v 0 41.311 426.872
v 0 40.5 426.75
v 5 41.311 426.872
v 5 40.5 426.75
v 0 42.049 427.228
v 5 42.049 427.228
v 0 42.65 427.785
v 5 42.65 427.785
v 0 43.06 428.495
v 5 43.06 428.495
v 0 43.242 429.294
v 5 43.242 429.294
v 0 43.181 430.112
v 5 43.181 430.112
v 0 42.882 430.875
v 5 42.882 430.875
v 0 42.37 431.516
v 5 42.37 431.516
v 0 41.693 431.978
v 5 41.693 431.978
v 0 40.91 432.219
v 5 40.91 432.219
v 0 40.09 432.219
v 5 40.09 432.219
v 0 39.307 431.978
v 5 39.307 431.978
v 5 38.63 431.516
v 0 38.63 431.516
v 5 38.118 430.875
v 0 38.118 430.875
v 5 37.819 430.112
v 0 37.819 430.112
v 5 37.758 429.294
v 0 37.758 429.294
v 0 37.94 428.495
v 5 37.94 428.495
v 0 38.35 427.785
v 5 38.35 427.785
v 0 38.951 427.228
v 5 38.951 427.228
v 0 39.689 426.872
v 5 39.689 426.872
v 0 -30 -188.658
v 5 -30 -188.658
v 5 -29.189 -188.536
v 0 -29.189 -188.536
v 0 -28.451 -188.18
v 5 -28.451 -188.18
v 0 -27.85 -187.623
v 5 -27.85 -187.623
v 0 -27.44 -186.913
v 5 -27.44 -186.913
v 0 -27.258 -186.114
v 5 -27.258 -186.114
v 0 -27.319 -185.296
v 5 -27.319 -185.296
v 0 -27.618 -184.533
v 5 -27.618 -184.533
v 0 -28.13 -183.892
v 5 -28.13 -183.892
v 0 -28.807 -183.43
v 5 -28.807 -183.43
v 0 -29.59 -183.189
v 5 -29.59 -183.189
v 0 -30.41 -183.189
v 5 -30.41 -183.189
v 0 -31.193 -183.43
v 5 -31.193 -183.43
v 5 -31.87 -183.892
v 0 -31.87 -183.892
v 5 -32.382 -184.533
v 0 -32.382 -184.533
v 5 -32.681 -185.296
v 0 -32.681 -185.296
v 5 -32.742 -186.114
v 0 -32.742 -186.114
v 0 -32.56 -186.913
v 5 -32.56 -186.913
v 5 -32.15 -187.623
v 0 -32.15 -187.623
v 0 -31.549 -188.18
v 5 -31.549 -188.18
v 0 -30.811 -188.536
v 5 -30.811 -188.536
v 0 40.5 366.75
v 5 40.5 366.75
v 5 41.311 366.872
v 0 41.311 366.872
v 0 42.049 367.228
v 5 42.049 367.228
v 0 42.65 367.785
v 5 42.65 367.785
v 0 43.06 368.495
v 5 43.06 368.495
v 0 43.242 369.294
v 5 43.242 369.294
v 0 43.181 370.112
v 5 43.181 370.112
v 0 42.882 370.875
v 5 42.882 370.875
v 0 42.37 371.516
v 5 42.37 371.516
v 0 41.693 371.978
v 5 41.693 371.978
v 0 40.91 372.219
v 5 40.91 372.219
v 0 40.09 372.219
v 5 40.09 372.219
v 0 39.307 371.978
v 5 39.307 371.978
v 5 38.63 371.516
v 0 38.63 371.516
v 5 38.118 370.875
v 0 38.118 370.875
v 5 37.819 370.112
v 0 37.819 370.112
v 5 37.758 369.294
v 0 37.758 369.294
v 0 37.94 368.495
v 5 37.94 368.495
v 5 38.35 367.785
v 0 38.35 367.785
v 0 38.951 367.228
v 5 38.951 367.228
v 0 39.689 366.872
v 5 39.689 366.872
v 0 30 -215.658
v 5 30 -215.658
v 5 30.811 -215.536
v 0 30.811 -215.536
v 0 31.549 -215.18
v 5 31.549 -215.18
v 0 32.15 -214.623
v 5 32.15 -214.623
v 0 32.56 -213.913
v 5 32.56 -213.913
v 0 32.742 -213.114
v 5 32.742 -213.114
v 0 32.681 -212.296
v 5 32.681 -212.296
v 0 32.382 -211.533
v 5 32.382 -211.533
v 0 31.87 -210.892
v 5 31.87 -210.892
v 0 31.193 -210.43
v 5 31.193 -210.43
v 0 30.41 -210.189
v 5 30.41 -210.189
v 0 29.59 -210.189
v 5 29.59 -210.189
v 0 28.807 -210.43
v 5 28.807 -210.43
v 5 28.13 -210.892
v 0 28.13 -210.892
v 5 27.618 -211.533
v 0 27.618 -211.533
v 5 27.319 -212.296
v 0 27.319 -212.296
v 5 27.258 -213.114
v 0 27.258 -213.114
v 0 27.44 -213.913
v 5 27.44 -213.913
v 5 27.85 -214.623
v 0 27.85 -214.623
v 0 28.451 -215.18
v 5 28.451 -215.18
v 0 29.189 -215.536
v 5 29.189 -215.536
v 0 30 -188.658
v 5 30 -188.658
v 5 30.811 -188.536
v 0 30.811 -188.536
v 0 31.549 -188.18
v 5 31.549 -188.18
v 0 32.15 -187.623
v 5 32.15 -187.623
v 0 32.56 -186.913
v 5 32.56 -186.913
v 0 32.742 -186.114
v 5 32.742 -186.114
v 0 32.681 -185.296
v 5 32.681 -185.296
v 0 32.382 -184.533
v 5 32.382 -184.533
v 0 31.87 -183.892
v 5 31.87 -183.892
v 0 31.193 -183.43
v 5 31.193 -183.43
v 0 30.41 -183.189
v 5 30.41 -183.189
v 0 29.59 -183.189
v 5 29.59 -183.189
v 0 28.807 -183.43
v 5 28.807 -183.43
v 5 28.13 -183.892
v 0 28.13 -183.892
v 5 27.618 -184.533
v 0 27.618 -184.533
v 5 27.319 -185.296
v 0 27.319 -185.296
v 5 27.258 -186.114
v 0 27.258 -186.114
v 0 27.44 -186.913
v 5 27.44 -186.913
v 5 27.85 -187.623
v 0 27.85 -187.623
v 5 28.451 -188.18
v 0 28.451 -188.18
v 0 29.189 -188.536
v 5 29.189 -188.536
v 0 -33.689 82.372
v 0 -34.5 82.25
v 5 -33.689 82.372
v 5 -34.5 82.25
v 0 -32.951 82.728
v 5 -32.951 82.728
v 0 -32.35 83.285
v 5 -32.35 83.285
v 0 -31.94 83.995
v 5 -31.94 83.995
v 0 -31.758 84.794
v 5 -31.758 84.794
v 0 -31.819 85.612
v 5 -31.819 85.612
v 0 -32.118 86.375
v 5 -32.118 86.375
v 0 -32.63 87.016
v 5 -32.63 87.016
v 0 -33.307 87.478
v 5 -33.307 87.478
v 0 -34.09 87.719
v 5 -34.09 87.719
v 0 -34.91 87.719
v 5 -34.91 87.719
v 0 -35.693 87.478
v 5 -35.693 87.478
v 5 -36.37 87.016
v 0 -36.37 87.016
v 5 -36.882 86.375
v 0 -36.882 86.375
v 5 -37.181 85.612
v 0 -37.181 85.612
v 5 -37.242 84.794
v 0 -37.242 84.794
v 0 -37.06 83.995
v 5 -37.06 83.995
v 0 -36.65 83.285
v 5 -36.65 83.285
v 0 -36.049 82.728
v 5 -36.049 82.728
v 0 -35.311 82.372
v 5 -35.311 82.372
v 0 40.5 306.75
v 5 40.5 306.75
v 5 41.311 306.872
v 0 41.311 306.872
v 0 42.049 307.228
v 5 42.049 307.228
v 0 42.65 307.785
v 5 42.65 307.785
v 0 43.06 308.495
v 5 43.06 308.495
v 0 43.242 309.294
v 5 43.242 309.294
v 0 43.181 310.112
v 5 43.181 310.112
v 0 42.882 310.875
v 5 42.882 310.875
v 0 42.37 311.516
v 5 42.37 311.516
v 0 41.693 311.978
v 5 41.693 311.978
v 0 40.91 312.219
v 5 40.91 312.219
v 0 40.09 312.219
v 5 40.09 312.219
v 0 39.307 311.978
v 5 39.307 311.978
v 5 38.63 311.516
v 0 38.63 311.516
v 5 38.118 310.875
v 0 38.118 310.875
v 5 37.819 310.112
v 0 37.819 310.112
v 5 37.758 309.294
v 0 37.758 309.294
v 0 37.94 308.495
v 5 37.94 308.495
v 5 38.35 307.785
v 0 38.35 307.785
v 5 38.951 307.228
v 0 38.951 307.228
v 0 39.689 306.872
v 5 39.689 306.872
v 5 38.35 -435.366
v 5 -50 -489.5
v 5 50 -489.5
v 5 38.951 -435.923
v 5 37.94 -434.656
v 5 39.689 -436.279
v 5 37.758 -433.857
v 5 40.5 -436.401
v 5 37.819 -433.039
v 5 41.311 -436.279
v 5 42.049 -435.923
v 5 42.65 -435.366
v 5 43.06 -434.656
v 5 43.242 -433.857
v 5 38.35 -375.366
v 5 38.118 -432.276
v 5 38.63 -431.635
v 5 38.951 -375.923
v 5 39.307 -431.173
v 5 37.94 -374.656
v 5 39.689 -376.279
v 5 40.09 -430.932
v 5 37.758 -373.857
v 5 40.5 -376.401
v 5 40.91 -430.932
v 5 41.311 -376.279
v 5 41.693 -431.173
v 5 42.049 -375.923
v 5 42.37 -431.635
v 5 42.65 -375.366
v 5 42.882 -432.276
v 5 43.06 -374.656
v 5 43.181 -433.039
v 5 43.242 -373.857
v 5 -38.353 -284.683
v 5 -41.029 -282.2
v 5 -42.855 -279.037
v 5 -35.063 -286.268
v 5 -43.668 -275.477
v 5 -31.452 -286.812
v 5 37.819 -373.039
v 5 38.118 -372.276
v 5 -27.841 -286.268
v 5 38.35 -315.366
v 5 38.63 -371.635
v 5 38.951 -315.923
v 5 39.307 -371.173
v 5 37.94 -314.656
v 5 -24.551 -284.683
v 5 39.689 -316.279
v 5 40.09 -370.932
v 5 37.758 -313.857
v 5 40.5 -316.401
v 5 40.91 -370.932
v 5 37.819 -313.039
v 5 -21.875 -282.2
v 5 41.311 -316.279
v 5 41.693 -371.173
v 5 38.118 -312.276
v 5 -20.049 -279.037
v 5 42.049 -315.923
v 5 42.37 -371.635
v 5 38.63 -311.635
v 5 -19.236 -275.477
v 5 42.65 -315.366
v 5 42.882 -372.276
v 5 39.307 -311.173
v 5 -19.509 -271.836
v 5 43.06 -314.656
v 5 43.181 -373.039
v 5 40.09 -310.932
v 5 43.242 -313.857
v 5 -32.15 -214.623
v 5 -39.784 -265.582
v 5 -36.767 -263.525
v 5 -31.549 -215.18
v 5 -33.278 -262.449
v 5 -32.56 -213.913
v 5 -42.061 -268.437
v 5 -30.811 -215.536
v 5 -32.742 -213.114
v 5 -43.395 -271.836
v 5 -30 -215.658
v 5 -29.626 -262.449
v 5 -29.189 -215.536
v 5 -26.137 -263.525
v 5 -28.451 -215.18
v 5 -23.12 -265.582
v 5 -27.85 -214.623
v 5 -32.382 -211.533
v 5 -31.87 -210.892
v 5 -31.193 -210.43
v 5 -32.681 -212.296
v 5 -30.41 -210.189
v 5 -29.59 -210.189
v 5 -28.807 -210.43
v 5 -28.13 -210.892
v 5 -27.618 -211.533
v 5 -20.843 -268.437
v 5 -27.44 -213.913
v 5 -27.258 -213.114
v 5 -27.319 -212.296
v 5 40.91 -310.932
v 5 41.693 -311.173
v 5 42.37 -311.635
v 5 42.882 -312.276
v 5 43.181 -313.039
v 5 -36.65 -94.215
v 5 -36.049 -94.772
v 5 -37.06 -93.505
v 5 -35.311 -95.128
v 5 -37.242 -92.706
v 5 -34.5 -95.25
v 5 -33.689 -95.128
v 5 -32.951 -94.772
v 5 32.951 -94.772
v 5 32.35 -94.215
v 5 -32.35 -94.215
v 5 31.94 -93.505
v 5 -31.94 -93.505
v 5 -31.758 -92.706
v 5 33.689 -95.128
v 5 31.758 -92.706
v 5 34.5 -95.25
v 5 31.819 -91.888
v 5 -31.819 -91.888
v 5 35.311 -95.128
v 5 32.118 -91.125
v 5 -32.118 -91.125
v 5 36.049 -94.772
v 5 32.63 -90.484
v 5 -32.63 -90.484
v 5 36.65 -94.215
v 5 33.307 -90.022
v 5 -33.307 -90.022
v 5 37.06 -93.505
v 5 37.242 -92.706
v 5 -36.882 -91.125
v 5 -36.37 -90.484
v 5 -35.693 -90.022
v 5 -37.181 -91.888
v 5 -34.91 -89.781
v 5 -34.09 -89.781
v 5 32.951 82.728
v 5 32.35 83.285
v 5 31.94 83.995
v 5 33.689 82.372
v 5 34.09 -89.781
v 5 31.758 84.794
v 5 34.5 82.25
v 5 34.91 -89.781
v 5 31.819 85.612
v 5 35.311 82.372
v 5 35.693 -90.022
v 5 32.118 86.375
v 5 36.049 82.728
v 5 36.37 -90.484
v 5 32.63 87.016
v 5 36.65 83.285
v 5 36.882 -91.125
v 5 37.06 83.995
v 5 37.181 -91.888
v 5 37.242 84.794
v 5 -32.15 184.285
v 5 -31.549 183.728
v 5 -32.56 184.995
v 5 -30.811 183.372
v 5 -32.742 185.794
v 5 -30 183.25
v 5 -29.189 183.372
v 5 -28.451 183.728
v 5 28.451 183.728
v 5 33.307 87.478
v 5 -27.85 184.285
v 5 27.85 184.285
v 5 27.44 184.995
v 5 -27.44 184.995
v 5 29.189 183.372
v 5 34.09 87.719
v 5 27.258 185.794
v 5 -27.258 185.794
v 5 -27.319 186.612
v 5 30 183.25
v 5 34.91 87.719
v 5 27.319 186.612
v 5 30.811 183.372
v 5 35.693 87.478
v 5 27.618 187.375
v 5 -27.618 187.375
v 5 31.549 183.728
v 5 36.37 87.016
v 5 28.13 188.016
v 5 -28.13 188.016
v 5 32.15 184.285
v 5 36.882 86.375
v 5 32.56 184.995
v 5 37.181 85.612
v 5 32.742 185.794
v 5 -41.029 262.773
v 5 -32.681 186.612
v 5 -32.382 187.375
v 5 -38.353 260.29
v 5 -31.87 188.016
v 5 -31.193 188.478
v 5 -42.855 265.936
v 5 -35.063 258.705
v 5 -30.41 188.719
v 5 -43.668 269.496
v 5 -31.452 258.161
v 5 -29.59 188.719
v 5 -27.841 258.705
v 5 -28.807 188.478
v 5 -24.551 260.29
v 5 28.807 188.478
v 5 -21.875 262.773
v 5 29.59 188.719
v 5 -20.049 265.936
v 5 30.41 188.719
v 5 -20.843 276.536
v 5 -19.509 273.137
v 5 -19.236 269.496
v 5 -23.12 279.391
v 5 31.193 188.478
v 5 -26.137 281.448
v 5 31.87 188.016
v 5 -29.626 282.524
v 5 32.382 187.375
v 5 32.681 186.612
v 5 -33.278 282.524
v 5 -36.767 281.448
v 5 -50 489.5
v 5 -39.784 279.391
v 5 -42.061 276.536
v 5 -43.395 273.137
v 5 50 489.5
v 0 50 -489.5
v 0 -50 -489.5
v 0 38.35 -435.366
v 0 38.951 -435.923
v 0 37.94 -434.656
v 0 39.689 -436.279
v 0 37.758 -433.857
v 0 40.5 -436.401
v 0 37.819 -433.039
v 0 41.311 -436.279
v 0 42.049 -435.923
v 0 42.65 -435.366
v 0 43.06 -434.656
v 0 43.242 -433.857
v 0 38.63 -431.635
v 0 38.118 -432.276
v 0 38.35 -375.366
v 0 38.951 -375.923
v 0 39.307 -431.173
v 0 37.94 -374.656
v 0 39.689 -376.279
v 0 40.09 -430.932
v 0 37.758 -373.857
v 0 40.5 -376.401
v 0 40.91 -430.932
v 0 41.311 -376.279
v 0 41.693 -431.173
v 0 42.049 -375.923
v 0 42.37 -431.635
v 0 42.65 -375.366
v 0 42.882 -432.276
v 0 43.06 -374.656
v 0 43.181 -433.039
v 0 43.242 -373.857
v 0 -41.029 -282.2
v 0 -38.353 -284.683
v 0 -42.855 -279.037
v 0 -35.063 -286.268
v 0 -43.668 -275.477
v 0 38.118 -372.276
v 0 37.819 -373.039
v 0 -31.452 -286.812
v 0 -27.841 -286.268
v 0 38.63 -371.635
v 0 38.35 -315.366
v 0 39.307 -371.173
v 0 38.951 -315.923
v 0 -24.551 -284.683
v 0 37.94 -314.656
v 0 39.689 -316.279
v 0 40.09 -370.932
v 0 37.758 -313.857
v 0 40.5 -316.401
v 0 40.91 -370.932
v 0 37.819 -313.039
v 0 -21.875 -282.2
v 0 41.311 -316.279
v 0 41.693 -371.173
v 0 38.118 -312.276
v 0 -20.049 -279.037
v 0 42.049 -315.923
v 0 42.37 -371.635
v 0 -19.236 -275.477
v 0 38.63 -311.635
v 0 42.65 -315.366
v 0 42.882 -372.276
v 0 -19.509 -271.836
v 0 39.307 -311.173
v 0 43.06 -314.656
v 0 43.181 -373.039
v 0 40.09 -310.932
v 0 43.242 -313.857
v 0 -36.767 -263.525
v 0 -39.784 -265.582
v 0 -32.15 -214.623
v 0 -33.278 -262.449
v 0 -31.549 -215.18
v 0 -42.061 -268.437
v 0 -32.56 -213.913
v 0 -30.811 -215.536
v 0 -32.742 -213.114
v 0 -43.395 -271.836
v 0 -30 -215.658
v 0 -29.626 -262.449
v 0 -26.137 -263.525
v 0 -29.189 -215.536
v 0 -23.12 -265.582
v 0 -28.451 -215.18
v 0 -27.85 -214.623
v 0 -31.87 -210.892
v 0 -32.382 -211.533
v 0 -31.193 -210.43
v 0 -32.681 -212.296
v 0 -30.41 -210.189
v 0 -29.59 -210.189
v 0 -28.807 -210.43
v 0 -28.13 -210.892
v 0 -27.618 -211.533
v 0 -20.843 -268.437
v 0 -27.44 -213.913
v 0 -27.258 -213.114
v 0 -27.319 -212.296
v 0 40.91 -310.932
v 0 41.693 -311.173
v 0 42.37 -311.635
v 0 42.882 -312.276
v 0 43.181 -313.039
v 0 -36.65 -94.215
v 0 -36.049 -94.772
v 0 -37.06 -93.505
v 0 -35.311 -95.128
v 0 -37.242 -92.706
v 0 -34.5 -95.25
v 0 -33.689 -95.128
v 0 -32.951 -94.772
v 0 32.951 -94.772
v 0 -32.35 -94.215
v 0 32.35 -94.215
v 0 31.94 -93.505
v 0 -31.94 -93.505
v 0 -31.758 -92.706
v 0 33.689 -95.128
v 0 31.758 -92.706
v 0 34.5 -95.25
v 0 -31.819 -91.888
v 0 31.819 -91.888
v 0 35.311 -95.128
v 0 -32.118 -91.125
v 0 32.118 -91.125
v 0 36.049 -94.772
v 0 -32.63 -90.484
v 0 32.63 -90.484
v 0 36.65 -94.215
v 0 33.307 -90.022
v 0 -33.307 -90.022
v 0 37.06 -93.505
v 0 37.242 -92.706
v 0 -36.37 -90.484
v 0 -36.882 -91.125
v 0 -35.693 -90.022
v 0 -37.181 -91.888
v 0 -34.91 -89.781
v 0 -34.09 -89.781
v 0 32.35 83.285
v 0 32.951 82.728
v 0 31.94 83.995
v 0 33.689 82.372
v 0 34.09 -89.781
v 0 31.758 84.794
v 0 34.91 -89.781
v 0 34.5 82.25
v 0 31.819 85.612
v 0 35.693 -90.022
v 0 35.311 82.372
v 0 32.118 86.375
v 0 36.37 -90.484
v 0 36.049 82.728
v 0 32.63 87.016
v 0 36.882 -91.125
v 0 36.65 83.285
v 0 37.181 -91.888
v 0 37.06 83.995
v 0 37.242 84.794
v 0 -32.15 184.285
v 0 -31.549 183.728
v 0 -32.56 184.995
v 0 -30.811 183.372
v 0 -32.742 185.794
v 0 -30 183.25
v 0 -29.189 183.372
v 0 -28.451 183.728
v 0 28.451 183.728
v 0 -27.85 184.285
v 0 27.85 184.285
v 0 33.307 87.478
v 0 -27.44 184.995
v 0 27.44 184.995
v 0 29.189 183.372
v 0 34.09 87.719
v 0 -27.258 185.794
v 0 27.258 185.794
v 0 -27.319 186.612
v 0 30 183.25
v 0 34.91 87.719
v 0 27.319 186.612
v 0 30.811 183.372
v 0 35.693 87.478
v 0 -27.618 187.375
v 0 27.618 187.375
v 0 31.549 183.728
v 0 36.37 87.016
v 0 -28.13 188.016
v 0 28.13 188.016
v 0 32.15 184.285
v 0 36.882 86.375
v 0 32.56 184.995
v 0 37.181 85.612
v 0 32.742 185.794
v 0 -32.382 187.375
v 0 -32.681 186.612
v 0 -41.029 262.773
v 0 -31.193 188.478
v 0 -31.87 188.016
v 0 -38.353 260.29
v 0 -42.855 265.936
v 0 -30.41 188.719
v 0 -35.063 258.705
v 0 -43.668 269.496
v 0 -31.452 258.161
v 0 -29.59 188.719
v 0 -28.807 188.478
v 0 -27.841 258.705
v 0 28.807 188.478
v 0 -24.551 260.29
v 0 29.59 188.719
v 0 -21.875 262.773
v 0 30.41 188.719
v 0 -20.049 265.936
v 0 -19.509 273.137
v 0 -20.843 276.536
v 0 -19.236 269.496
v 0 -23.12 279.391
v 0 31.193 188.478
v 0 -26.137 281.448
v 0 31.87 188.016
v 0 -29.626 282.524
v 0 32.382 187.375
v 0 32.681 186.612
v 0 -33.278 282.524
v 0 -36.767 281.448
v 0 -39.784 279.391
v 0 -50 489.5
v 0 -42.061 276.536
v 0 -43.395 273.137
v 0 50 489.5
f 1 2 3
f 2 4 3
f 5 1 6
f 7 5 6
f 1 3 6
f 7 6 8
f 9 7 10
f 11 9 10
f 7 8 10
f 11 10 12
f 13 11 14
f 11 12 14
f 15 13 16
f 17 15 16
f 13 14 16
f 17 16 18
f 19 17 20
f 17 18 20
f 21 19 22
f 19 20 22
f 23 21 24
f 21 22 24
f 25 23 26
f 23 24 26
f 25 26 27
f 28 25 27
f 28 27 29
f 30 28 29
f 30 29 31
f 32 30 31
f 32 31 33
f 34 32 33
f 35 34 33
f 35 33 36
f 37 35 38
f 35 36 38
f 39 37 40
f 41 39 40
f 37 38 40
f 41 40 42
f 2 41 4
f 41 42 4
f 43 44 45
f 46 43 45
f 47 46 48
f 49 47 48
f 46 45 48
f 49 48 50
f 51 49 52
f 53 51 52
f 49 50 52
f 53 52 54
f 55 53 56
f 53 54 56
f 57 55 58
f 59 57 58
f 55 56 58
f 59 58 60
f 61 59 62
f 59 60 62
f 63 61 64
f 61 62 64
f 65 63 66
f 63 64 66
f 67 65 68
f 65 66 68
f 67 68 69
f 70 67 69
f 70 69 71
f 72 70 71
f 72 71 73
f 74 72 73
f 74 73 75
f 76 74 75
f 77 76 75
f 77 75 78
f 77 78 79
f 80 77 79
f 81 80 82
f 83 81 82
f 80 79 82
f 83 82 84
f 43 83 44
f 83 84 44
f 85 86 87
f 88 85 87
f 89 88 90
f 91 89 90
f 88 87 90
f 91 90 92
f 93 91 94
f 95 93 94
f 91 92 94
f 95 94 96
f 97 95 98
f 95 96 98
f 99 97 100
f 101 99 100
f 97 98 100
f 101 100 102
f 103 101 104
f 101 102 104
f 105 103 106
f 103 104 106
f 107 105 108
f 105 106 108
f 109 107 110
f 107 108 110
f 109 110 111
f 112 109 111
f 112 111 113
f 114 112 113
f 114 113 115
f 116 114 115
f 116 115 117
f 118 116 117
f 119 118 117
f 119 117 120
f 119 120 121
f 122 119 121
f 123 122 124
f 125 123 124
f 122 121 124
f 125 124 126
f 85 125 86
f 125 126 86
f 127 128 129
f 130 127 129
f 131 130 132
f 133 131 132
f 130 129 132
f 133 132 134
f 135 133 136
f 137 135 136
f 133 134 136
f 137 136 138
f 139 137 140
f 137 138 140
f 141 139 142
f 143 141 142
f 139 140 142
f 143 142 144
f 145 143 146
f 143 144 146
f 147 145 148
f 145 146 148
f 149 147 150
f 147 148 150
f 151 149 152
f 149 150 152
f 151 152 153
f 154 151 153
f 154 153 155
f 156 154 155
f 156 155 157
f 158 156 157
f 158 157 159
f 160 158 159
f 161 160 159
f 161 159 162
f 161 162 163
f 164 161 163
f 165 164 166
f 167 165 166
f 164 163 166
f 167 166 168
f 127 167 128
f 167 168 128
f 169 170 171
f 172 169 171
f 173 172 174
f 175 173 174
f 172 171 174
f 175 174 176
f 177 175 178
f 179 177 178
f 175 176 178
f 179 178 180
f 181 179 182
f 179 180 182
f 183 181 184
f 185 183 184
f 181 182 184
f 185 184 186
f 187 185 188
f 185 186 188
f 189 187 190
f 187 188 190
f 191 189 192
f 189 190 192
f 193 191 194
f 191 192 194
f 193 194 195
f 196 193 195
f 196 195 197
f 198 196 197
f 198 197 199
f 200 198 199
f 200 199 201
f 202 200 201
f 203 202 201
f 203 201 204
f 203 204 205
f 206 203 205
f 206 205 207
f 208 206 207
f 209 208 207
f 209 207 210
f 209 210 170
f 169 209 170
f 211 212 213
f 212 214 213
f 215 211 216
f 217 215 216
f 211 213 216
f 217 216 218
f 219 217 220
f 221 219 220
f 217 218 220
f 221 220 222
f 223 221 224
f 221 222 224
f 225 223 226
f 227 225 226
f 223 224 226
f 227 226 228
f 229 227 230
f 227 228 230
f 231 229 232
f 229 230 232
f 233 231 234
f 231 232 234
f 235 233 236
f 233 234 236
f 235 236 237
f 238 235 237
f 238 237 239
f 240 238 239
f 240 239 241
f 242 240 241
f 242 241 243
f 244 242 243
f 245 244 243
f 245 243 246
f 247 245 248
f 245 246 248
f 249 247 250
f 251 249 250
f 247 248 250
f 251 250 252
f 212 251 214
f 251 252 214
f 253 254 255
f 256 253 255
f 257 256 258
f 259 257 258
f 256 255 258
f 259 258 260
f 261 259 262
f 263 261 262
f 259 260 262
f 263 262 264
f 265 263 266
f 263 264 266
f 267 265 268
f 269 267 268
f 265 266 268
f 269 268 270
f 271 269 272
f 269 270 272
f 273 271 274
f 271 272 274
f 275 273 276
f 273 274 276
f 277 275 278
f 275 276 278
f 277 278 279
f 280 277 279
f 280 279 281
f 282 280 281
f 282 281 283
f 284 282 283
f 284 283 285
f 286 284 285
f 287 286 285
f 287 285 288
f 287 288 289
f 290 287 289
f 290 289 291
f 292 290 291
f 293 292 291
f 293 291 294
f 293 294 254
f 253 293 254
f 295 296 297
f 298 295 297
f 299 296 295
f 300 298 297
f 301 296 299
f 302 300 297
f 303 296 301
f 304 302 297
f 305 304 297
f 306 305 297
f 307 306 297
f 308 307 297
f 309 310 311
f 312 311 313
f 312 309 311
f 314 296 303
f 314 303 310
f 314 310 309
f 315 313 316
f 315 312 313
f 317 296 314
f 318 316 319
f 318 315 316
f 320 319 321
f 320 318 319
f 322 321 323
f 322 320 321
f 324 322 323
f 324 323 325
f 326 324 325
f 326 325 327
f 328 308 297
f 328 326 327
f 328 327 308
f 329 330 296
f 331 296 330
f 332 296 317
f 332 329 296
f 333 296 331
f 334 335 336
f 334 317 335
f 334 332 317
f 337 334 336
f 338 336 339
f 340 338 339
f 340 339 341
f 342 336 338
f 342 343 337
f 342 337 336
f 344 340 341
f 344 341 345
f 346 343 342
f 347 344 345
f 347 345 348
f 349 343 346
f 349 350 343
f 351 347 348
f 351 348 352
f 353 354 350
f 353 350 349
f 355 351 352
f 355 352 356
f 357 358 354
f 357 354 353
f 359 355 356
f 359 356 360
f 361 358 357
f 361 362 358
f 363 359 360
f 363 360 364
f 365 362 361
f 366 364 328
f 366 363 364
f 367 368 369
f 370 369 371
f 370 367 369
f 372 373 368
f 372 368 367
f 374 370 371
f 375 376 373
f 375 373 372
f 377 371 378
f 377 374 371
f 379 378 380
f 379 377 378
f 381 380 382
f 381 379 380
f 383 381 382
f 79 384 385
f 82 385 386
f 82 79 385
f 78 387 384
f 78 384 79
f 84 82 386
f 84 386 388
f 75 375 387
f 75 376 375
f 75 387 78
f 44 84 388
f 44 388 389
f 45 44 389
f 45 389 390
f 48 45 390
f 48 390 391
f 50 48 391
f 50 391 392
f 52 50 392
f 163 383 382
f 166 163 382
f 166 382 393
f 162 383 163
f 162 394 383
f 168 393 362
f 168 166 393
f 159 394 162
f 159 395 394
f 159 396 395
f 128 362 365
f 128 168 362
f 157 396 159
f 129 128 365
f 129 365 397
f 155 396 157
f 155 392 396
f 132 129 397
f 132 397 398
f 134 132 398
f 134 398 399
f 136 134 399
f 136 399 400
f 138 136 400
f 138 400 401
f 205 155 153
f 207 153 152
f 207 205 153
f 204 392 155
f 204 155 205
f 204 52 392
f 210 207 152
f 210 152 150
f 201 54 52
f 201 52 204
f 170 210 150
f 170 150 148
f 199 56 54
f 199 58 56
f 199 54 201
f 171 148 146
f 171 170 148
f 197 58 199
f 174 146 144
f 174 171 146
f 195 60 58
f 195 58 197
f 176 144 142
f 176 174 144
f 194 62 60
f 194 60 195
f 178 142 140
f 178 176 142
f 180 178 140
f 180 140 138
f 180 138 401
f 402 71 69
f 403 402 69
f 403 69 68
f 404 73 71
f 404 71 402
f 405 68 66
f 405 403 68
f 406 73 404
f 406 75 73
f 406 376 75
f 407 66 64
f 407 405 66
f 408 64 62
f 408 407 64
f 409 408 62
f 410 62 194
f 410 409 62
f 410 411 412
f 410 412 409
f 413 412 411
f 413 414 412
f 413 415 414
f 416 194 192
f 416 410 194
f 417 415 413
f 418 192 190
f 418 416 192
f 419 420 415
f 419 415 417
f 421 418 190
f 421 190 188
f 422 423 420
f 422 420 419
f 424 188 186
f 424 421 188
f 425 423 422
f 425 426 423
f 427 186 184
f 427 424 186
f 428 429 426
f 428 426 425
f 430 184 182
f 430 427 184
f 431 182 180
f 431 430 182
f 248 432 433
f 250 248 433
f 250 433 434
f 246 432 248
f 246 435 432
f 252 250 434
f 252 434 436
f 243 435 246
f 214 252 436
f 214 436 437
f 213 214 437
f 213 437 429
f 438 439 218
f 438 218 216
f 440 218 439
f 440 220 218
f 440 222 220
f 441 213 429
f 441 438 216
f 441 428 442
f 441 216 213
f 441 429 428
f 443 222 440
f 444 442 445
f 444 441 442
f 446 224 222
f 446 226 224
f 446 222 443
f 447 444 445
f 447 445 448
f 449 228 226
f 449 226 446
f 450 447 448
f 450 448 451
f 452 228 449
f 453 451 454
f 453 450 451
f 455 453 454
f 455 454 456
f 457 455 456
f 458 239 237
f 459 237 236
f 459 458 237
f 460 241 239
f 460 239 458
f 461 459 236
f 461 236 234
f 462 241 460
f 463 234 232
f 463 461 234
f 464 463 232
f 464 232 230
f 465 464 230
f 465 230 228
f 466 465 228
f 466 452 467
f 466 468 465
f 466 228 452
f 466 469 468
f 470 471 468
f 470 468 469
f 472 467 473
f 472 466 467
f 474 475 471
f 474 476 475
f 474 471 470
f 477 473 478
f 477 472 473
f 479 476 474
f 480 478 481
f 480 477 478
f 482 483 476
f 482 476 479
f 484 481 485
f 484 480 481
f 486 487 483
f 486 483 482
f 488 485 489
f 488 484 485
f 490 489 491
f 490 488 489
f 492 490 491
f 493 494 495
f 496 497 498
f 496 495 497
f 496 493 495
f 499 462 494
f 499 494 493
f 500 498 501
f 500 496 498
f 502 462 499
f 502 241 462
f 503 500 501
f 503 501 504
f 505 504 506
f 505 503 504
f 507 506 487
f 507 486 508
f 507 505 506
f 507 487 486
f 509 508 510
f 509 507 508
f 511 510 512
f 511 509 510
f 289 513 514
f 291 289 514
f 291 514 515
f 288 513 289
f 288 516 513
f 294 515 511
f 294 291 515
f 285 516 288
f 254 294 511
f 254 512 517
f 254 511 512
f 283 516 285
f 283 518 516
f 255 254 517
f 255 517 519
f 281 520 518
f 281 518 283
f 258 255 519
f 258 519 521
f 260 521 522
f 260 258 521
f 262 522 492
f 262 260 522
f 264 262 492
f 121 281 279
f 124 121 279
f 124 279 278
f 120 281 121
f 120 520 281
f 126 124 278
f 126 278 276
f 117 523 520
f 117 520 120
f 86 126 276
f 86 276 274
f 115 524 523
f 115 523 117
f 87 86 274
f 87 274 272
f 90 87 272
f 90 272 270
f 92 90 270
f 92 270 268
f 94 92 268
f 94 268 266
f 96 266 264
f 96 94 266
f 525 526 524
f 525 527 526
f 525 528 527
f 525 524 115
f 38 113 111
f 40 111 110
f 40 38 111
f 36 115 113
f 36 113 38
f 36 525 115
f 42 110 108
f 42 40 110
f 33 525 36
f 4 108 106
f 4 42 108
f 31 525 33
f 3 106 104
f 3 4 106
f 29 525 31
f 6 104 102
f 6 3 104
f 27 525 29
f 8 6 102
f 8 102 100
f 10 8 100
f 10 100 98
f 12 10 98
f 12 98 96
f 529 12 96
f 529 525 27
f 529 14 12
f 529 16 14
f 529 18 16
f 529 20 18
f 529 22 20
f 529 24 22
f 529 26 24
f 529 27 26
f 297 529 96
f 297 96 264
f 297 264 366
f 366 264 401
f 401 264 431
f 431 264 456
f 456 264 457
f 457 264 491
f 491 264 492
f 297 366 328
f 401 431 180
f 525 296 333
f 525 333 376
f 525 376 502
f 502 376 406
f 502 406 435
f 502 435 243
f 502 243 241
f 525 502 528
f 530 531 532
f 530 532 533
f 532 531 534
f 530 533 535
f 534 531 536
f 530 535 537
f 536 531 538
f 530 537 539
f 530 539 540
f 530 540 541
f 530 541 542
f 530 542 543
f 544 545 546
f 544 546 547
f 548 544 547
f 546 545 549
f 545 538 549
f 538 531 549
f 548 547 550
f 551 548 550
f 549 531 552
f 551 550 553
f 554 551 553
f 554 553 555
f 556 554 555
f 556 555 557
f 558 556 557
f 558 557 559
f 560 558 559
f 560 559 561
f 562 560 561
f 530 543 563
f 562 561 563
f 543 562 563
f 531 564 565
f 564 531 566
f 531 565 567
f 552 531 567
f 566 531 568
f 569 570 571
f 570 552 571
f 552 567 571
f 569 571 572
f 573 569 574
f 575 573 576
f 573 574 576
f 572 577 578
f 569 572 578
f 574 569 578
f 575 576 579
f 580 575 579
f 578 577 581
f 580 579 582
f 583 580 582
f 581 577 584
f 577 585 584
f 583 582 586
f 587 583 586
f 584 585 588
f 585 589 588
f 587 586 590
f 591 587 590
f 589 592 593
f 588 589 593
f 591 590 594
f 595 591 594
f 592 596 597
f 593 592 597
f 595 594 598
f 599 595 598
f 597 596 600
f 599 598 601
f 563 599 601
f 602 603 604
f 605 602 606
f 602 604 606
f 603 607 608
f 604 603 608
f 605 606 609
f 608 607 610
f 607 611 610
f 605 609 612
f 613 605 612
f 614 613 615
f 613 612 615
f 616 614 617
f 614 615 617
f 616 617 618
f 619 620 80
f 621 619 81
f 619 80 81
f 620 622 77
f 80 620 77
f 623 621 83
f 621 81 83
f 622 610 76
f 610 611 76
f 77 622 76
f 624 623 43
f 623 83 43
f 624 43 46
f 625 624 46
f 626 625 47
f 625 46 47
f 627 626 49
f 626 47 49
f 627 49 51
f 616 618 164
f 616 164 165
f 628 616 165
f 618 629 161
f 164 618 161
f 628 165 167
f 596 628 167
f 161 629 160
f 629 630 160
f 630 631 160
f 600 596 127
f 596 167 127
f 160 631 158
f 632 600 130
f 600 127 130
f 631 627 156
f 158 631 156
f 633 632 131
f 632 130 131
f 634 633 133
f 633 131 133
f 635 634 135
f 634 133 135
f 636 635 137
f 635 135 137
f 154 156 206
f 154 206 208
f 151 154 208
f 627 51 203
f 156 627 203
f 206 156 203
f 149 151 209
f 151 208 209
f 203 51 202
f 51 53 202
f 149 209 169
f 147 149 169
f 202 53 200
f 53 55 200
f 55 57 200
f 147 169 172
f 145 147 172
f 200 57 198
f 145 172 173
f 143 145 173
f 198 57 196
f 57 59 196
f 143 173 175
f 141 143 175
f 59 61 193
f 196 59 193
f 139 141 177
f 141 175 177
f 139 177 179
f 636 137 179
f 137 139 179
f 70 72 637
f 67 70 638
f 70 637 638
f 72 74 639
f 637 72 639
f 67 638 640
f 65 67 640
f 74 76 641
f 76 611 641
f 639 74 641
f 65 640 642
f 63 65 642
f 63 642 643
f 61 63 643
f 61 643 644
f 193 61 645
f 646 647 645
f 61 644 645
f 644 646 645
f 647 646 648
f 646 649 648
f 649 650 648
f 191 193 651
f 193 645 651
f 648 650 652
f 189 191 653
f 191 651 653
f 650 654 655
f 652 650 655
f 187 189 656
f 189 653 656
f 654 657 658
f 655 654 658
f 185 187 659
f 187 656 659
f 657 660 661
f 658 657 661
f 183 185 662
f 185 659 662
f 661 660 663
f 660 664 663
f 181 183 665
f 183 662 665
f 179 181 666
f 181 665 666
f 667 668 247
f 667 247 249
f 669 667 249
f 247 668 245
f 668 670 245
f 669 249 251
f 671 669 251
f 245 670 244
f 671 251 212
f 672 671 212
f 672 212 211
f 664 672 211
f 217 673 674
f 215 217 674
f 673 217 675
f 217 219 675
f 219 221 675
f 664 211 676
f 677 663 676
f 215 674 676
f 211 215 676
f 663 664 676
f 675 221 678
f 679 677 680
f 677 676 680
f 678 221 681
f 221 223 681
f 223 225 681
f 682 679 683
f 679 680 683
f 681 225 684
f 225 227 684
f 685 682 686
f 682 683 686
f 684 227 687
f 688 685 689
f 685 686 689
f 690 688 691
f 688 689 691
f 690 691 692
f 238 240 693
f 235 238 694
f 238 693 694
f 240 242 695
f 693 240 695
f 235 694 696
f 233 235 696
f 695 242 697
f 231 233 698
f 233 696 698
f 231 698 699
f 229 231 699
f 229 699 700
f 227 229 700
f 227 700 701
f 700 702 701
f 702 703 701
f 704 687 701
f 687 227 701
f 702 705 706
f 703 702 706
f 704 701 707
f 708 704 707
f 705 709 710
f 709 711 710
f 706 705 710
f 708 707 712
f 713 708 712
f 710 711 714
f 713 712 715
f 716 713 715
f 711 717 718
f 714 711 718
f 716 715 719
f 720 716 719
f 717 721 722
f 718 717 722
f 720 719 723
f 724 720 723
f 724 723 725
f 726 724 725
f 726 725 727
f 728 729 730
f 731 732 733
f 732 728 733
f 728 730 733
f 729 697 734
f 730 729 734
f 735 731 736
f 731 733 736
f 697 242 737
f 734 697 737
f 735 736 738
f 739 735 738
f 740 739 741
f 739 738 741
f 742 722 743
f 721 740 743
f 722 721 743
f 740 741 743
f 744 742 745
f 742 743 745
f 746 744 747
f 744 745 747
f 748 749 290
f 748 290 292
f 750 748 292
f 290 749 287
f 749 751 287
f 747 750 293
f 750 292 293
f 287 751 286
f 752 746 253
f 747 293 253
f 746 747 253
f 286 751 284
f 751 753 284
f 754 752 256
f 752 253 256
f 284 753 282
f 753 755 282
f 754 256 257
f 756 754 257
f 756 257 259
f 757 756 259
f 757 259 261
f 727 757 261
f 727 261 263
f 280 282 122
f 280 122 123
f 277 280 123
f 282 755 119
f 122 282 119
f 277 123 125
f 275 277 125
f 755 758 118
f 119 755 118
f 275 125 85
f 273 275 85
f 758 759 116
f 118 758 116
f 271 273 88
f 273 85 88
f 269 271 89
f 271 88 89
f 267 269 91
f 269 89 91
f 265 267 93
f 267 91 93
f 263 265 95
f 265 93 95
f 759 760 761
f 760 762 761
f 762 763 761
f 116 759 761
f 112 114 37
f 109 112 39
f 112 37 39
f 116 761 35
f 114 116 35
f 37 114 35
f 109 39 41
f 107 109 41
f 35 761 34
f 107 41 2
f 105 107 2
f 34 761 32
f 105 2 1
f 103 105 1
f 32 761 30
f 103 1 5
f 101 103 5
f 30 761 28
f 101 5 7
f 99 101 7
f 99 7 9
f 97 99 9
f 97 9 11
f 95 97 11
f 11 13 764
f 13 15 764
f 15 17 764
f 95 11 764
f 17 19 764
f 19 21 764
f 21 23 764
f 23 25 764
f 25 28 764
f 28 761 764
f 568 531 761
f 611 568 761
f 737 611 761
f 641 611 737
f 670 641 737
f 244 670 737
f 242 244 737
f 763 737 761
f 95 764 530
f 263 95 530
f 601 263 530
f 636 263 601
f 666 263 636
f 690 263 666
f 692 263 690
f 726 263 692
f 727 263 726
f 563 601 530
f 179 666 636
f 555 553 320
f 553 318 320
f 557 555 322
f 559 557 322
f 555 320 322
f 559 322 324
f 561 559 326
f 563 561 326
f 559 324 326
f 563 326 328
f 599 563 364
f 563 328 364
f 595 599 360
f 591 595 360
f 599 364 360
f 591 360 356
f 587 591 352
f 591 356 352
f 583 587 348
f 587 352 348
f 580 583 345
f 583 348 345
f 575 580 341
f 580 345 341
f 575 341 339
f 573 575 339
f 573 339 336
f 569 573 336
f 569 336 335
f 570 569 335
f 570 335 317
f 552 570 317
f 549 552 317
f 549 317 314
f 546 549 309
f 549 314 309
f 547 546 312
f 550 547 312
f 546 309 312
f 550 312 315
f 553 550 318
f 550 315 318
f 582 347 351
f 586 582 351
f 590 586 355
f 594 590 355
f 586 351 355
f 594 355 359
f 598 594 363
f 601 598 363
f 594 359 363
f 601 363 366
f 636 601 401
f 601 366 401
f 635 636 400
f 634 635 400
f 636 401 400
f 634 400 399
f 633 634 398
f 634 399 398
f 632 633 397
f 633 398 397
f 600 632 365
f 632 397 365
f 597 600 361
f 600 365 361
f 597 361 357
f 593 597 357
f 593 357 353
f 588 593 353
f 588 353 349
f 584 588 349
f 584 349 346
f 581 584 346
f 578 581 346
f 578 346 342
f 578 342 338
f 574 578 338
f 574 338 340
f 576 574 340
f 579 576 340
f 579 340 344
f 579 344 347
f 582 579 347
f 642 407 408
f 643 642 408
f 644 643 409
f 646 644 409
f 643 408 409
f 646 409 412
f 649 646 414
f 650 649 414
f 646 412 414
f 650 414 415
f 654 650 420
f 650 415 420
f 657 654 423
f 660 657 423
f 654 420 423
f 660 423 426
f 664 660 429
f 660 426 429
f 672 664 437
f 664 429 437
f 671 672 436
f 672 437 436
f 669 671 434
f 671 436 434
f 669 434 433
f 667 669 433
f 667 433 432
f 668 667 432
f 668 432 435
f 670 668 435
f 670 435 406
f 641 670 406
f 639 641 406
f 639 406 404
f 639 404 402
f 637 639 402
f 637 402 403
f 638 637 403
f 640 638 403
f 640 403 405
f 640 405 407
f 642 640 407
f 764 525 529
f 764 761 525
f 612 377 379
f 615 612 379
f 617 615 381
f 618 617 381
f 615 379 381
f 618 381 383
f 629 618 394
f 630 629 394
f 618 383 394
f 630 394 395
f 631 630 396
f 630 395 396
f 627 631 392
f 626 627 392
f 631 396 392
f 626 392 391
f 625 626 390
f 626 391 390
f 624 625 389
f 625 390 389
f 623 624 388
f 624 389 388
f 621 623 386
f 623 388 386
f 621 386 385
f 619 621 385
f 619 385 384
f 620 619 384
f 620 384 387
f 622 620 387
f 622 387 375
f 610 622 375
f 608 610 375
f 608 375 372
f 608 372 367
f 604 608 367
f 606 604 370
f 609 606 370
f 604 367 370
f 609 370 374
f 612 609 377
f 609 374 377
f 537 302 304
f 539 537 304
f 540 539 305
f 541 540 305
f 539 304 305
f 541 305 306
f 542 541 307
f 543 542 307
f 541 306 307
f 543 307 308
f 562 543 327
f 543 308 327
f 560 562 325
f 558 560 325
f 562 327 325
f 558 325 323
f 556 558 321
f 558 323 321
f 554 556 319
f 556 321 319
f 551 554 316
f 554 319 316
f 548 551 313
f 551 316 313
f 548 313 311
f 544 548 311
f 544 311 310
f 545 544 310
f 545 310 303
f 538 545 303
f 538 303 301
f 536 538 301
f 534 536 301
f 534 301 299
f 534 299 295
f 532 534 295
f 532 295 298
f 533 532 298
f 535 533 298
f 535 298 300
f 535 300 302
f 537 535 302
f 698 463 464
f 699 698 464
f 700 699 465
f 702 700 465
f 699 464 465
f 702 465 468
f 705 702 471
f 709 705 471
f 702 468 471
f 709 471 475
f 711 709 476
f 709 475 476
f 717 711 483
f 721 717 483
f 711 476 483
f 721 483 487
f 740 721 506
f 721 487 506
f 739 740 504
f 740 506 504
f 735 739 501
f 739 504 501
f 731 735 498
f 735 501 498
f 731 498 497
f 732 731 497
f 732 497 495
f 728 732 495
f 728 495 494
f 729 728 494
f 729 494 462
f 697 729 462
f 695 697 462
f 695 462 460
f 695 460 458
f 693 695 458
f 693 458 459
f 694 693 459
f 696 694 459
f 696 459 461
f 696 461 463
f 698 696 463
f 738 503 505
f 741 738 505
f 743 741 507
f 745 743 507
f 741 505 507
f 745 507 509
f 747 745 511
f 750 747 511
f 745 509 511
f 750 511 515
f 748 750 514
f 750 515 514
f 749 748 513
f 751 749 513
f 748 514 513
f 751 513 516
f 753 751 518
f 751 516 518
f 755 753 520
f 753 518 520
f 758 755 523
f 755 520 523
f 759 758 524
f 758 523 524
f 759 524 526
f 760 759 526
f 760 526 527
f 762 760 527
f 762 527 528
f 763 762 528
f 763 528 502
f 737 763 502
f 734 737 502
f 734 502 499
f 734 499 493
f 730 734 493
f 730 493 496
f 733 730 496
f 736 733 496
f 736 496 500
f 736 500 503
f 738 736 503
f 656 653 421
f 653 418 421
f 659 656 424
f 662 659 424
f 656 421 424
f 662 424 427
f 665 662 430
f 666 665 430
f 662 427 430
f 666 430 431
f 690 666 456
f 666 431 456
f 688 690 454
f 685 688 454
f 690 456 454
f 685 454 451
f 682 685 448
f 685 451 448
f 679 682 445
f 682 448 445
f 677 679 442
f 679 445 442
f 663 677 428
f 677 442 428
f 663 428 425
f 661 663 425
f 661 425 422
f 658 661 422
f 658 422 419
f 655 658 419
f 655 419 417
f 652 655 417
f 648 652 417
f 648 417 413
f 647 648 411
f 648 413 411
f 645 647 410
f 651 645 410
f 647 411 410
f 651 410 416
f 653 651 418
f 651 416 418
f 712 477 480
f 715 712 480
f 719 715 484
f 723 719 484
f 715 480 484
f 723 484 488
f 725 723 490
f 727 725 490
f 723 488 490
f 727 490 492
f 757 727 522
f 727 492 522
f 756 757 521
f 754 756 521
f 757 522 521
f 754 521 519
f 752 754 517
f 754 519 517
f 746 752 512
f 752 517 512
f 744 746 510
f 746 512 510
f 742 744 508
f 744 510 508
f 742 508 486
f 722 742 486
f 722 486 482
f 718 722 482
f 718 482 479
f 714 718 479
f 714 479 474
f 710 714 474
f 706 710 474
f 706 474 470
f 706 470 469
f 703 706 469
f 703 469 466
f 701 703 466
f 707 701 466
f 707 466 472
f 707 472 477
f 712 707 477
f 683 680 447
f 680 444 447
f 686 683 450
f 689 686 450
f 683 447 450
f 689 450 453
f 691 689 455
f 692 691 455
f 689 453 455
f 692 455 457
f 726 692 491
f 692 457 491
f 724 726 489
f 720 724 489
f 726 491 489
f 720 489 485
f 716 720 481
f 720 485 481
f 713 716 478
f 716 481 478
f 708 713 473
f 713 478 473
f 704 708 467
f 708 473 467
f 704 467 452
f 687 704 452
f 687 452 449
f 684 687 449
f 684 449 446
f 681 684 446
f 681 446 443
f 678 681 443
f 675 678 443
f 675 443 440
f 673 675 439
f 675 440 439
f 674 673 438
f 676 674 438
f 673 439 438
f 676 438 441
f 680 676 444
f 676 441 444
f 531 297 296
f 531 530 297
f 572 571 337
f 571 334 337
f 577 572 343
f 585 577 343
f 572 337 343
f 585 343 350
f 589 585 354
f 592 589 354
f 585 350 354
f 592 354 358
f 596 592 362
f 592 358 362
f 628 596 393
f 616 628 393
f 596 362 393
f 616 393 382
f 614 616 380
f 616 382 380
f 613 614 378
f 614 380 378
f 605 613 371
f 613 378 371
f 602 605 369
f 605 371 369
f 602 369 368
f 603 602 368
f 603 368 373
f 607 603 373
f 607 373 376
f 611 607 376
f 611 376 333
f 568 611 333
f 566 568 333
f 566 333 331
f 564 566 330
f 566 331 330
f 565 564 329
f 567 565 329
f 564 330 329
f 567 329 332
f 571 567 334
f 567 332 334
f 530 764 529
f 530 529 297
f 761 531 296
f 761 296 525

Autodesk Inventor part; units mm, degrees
ref_plane "YZ Plane" through (0, 0, 0) normal (1, 0, 0) x (0, 1, 0)
ref_plane "XZ Plane" through (0, 0, 0) normal (0, 1, 0) x (-1, 0, 0)
ref_plane "XY Plane" through (0, 0, 0) normal (0, 0, 1) x (1, 0, 0)
sketch "Sketch1" plane through (0, 0, 0) normal (1, 0, 0) x (0, 1, 0)
  line L0 (-50, 489.5) -> (50, 489.5)
  line L1 (50, 489.5) -> (50, -489.5)
  line L2 (50, -489.5) -> (-50, -489.5)
  line L3 (-50, -489.5) -> (-50, 489.5)
  line L4 (-50, 489.5) -> (50, -489.5) construction
  line L5 (50, 489.5) -> (-50, -489.5) construction
  point P0 (0, 0)
  dimension "d0" = 979
  dimension "d1" = 100
extrude "Extrusion1" add sketch "Sketch1" along normal blind 5
sketch "Sketch2" plane through (5, 0, 0) normal (1, 0, 0) x (0, 0, -1)
  circle A0 centre (-270.411, -31.452) radius 12.25
  line L0 (-489.5, -50) -> (489.5, -50) projected
  line L1 (-489.5, 50) -> (-489.5, -50) projected
  circle A1 centre (274.562, -31.452) radius 12.25
  line L2 (489.5, -50) -> (489.5, 50) projected
  point P0 (0, 0)
  dimension "d4" = 24.5
  dimension "d5" = 18.548
  dimension "d8" = 219.089
  dimension "d18" = 214.938
  dimension "d19" = 24.5
  dimension "d20" = 18.548
extrude "Extrusion2" cut sketch "Sketch2" against normal through all
sketch "Sketch6" plane through (5, 0, 0) normal (1, 0, 0) x (0, 0, -1)
  circle A0 centre (274.5619, -31.452) radius 16.3 projected
  circle A1 centre (212.908, -30) radius 2.75 projected
  circle A2 centre (-124.274, -40) radius 2.75 projected
  circle A3 centre (-164.274, 40) radius 2.75 projected
  circle A4 centre (313.651, 40.5) radius 2.75 projected
  circle A5 centre (433.651, 40.5) radius 2.75 projected
  circle A6 centre (-309.5, 40.5) radius 2.75 projected
  circle A7 centre (-85, -34.5) radius 2.75 projected
  circle A8 centre (-186, 30) radius 2.75 projected
  circle A9 centre (92.5, -34.5) radius 2.75 projected
  circle A10 centre (185.908, -30) radius 2.75 projected
  circle A11 centre (185.908, 30) radius 2.75 projected
  circle A12 centre (92.5, 34.5) radius 2.75 projected
  circle A13 centre (-186, -30) radius 2.75 projected
  circle A14 centre (-85, 34.5) radius 2.75 projected
  circle A15 centre (-429.5, 40.5) radius 2.75 projected
  circle A16 centre (-369.5, 40.5) radius 2.75 projected
  circle A17 centre (373.651, 40.5) radius 2.75 projected
  circle A18 centre (-124.274, 40) radius 2.75 projected
  circle A19 centre (-154.274, -40) radius 2.75 projected
  circle A20 centre (212.908, 30) radius 2.75 projected
  circle A21 centre (148.424, 0) radius 9.8 projected
  circle A22 centre (-61.972, 12.7) radius 2.25 projected
  circle A23 centre (-87.372, 12.7) radius 2.25 projected
  circle A24 centre (-87.372, -12.7) radius 2.25 projected
  circle A25 centre (-61.972, -12.7) radius 2.25 projected
  line L0 (-19.5, -25) -> (-19.5, 25) projected
  line L1 (-19.5, 25) -> (110.5, 25) projected
  line L2 (110.5, 25) -> (110.5, -25) projected
  line L3 (110.5, -25) -> (-19.5, -25) projected
  circle A26 centre (-144.273, 0) radius 30 projected
  arc A27 (-360.3076, -42.4652) -> (-351.3744, -41.3708) centre (-355.841, -41.918) ccw projected
  arc A28 (-360.9797, -31.4275) -> (-360.3076, -42.4652) centre (-270.411, -31.452) ccw projected
  arc A29 (-351.9797, -31.4299) -> (-360.9797, -31.4275) centre (-356.4797, -31.4287) ccw projected
  arc A30 (-351.9797, -31.4299) -> (-351.3744, -41.3708) centre (-270.411, -31.452) ccw projected
  circle A31 centre (-270.411, -31.452) radius 16.3 projected
  line L4 (-469.5, 50) -> (-469.5, -50) projected
  line L5 (-469.5, -50) -> (469.5, -50) projected
  line L6 (469.5, 50) -> (469.5, -50) projected
  line L7 (-469.5, 50) -> (469.5, 50) projected
  circle A32 centre (128.424, -40) radius 2.75 projected
  circle A33 centre (128.424, 40) radius 2.75 projected
  circle A34 centre (168.424, 40) radius 2.75 projected
  circle A35 centre (158.424, -40) radius 2.75 projected
  point P0 (0, 0)
extrude "Extrusion4" cut sketch "Sketch6" against normal blind 10 contours A1 | A4 | A5 | A6 | A7 | A8 | A9 | A10 | A11 | A12 | A13 | A14 | A15 | A16 | A17 | A20
equation "\"d20\" = d5"
properties part number "Bumper Plate" material "Aluminum 6061"
